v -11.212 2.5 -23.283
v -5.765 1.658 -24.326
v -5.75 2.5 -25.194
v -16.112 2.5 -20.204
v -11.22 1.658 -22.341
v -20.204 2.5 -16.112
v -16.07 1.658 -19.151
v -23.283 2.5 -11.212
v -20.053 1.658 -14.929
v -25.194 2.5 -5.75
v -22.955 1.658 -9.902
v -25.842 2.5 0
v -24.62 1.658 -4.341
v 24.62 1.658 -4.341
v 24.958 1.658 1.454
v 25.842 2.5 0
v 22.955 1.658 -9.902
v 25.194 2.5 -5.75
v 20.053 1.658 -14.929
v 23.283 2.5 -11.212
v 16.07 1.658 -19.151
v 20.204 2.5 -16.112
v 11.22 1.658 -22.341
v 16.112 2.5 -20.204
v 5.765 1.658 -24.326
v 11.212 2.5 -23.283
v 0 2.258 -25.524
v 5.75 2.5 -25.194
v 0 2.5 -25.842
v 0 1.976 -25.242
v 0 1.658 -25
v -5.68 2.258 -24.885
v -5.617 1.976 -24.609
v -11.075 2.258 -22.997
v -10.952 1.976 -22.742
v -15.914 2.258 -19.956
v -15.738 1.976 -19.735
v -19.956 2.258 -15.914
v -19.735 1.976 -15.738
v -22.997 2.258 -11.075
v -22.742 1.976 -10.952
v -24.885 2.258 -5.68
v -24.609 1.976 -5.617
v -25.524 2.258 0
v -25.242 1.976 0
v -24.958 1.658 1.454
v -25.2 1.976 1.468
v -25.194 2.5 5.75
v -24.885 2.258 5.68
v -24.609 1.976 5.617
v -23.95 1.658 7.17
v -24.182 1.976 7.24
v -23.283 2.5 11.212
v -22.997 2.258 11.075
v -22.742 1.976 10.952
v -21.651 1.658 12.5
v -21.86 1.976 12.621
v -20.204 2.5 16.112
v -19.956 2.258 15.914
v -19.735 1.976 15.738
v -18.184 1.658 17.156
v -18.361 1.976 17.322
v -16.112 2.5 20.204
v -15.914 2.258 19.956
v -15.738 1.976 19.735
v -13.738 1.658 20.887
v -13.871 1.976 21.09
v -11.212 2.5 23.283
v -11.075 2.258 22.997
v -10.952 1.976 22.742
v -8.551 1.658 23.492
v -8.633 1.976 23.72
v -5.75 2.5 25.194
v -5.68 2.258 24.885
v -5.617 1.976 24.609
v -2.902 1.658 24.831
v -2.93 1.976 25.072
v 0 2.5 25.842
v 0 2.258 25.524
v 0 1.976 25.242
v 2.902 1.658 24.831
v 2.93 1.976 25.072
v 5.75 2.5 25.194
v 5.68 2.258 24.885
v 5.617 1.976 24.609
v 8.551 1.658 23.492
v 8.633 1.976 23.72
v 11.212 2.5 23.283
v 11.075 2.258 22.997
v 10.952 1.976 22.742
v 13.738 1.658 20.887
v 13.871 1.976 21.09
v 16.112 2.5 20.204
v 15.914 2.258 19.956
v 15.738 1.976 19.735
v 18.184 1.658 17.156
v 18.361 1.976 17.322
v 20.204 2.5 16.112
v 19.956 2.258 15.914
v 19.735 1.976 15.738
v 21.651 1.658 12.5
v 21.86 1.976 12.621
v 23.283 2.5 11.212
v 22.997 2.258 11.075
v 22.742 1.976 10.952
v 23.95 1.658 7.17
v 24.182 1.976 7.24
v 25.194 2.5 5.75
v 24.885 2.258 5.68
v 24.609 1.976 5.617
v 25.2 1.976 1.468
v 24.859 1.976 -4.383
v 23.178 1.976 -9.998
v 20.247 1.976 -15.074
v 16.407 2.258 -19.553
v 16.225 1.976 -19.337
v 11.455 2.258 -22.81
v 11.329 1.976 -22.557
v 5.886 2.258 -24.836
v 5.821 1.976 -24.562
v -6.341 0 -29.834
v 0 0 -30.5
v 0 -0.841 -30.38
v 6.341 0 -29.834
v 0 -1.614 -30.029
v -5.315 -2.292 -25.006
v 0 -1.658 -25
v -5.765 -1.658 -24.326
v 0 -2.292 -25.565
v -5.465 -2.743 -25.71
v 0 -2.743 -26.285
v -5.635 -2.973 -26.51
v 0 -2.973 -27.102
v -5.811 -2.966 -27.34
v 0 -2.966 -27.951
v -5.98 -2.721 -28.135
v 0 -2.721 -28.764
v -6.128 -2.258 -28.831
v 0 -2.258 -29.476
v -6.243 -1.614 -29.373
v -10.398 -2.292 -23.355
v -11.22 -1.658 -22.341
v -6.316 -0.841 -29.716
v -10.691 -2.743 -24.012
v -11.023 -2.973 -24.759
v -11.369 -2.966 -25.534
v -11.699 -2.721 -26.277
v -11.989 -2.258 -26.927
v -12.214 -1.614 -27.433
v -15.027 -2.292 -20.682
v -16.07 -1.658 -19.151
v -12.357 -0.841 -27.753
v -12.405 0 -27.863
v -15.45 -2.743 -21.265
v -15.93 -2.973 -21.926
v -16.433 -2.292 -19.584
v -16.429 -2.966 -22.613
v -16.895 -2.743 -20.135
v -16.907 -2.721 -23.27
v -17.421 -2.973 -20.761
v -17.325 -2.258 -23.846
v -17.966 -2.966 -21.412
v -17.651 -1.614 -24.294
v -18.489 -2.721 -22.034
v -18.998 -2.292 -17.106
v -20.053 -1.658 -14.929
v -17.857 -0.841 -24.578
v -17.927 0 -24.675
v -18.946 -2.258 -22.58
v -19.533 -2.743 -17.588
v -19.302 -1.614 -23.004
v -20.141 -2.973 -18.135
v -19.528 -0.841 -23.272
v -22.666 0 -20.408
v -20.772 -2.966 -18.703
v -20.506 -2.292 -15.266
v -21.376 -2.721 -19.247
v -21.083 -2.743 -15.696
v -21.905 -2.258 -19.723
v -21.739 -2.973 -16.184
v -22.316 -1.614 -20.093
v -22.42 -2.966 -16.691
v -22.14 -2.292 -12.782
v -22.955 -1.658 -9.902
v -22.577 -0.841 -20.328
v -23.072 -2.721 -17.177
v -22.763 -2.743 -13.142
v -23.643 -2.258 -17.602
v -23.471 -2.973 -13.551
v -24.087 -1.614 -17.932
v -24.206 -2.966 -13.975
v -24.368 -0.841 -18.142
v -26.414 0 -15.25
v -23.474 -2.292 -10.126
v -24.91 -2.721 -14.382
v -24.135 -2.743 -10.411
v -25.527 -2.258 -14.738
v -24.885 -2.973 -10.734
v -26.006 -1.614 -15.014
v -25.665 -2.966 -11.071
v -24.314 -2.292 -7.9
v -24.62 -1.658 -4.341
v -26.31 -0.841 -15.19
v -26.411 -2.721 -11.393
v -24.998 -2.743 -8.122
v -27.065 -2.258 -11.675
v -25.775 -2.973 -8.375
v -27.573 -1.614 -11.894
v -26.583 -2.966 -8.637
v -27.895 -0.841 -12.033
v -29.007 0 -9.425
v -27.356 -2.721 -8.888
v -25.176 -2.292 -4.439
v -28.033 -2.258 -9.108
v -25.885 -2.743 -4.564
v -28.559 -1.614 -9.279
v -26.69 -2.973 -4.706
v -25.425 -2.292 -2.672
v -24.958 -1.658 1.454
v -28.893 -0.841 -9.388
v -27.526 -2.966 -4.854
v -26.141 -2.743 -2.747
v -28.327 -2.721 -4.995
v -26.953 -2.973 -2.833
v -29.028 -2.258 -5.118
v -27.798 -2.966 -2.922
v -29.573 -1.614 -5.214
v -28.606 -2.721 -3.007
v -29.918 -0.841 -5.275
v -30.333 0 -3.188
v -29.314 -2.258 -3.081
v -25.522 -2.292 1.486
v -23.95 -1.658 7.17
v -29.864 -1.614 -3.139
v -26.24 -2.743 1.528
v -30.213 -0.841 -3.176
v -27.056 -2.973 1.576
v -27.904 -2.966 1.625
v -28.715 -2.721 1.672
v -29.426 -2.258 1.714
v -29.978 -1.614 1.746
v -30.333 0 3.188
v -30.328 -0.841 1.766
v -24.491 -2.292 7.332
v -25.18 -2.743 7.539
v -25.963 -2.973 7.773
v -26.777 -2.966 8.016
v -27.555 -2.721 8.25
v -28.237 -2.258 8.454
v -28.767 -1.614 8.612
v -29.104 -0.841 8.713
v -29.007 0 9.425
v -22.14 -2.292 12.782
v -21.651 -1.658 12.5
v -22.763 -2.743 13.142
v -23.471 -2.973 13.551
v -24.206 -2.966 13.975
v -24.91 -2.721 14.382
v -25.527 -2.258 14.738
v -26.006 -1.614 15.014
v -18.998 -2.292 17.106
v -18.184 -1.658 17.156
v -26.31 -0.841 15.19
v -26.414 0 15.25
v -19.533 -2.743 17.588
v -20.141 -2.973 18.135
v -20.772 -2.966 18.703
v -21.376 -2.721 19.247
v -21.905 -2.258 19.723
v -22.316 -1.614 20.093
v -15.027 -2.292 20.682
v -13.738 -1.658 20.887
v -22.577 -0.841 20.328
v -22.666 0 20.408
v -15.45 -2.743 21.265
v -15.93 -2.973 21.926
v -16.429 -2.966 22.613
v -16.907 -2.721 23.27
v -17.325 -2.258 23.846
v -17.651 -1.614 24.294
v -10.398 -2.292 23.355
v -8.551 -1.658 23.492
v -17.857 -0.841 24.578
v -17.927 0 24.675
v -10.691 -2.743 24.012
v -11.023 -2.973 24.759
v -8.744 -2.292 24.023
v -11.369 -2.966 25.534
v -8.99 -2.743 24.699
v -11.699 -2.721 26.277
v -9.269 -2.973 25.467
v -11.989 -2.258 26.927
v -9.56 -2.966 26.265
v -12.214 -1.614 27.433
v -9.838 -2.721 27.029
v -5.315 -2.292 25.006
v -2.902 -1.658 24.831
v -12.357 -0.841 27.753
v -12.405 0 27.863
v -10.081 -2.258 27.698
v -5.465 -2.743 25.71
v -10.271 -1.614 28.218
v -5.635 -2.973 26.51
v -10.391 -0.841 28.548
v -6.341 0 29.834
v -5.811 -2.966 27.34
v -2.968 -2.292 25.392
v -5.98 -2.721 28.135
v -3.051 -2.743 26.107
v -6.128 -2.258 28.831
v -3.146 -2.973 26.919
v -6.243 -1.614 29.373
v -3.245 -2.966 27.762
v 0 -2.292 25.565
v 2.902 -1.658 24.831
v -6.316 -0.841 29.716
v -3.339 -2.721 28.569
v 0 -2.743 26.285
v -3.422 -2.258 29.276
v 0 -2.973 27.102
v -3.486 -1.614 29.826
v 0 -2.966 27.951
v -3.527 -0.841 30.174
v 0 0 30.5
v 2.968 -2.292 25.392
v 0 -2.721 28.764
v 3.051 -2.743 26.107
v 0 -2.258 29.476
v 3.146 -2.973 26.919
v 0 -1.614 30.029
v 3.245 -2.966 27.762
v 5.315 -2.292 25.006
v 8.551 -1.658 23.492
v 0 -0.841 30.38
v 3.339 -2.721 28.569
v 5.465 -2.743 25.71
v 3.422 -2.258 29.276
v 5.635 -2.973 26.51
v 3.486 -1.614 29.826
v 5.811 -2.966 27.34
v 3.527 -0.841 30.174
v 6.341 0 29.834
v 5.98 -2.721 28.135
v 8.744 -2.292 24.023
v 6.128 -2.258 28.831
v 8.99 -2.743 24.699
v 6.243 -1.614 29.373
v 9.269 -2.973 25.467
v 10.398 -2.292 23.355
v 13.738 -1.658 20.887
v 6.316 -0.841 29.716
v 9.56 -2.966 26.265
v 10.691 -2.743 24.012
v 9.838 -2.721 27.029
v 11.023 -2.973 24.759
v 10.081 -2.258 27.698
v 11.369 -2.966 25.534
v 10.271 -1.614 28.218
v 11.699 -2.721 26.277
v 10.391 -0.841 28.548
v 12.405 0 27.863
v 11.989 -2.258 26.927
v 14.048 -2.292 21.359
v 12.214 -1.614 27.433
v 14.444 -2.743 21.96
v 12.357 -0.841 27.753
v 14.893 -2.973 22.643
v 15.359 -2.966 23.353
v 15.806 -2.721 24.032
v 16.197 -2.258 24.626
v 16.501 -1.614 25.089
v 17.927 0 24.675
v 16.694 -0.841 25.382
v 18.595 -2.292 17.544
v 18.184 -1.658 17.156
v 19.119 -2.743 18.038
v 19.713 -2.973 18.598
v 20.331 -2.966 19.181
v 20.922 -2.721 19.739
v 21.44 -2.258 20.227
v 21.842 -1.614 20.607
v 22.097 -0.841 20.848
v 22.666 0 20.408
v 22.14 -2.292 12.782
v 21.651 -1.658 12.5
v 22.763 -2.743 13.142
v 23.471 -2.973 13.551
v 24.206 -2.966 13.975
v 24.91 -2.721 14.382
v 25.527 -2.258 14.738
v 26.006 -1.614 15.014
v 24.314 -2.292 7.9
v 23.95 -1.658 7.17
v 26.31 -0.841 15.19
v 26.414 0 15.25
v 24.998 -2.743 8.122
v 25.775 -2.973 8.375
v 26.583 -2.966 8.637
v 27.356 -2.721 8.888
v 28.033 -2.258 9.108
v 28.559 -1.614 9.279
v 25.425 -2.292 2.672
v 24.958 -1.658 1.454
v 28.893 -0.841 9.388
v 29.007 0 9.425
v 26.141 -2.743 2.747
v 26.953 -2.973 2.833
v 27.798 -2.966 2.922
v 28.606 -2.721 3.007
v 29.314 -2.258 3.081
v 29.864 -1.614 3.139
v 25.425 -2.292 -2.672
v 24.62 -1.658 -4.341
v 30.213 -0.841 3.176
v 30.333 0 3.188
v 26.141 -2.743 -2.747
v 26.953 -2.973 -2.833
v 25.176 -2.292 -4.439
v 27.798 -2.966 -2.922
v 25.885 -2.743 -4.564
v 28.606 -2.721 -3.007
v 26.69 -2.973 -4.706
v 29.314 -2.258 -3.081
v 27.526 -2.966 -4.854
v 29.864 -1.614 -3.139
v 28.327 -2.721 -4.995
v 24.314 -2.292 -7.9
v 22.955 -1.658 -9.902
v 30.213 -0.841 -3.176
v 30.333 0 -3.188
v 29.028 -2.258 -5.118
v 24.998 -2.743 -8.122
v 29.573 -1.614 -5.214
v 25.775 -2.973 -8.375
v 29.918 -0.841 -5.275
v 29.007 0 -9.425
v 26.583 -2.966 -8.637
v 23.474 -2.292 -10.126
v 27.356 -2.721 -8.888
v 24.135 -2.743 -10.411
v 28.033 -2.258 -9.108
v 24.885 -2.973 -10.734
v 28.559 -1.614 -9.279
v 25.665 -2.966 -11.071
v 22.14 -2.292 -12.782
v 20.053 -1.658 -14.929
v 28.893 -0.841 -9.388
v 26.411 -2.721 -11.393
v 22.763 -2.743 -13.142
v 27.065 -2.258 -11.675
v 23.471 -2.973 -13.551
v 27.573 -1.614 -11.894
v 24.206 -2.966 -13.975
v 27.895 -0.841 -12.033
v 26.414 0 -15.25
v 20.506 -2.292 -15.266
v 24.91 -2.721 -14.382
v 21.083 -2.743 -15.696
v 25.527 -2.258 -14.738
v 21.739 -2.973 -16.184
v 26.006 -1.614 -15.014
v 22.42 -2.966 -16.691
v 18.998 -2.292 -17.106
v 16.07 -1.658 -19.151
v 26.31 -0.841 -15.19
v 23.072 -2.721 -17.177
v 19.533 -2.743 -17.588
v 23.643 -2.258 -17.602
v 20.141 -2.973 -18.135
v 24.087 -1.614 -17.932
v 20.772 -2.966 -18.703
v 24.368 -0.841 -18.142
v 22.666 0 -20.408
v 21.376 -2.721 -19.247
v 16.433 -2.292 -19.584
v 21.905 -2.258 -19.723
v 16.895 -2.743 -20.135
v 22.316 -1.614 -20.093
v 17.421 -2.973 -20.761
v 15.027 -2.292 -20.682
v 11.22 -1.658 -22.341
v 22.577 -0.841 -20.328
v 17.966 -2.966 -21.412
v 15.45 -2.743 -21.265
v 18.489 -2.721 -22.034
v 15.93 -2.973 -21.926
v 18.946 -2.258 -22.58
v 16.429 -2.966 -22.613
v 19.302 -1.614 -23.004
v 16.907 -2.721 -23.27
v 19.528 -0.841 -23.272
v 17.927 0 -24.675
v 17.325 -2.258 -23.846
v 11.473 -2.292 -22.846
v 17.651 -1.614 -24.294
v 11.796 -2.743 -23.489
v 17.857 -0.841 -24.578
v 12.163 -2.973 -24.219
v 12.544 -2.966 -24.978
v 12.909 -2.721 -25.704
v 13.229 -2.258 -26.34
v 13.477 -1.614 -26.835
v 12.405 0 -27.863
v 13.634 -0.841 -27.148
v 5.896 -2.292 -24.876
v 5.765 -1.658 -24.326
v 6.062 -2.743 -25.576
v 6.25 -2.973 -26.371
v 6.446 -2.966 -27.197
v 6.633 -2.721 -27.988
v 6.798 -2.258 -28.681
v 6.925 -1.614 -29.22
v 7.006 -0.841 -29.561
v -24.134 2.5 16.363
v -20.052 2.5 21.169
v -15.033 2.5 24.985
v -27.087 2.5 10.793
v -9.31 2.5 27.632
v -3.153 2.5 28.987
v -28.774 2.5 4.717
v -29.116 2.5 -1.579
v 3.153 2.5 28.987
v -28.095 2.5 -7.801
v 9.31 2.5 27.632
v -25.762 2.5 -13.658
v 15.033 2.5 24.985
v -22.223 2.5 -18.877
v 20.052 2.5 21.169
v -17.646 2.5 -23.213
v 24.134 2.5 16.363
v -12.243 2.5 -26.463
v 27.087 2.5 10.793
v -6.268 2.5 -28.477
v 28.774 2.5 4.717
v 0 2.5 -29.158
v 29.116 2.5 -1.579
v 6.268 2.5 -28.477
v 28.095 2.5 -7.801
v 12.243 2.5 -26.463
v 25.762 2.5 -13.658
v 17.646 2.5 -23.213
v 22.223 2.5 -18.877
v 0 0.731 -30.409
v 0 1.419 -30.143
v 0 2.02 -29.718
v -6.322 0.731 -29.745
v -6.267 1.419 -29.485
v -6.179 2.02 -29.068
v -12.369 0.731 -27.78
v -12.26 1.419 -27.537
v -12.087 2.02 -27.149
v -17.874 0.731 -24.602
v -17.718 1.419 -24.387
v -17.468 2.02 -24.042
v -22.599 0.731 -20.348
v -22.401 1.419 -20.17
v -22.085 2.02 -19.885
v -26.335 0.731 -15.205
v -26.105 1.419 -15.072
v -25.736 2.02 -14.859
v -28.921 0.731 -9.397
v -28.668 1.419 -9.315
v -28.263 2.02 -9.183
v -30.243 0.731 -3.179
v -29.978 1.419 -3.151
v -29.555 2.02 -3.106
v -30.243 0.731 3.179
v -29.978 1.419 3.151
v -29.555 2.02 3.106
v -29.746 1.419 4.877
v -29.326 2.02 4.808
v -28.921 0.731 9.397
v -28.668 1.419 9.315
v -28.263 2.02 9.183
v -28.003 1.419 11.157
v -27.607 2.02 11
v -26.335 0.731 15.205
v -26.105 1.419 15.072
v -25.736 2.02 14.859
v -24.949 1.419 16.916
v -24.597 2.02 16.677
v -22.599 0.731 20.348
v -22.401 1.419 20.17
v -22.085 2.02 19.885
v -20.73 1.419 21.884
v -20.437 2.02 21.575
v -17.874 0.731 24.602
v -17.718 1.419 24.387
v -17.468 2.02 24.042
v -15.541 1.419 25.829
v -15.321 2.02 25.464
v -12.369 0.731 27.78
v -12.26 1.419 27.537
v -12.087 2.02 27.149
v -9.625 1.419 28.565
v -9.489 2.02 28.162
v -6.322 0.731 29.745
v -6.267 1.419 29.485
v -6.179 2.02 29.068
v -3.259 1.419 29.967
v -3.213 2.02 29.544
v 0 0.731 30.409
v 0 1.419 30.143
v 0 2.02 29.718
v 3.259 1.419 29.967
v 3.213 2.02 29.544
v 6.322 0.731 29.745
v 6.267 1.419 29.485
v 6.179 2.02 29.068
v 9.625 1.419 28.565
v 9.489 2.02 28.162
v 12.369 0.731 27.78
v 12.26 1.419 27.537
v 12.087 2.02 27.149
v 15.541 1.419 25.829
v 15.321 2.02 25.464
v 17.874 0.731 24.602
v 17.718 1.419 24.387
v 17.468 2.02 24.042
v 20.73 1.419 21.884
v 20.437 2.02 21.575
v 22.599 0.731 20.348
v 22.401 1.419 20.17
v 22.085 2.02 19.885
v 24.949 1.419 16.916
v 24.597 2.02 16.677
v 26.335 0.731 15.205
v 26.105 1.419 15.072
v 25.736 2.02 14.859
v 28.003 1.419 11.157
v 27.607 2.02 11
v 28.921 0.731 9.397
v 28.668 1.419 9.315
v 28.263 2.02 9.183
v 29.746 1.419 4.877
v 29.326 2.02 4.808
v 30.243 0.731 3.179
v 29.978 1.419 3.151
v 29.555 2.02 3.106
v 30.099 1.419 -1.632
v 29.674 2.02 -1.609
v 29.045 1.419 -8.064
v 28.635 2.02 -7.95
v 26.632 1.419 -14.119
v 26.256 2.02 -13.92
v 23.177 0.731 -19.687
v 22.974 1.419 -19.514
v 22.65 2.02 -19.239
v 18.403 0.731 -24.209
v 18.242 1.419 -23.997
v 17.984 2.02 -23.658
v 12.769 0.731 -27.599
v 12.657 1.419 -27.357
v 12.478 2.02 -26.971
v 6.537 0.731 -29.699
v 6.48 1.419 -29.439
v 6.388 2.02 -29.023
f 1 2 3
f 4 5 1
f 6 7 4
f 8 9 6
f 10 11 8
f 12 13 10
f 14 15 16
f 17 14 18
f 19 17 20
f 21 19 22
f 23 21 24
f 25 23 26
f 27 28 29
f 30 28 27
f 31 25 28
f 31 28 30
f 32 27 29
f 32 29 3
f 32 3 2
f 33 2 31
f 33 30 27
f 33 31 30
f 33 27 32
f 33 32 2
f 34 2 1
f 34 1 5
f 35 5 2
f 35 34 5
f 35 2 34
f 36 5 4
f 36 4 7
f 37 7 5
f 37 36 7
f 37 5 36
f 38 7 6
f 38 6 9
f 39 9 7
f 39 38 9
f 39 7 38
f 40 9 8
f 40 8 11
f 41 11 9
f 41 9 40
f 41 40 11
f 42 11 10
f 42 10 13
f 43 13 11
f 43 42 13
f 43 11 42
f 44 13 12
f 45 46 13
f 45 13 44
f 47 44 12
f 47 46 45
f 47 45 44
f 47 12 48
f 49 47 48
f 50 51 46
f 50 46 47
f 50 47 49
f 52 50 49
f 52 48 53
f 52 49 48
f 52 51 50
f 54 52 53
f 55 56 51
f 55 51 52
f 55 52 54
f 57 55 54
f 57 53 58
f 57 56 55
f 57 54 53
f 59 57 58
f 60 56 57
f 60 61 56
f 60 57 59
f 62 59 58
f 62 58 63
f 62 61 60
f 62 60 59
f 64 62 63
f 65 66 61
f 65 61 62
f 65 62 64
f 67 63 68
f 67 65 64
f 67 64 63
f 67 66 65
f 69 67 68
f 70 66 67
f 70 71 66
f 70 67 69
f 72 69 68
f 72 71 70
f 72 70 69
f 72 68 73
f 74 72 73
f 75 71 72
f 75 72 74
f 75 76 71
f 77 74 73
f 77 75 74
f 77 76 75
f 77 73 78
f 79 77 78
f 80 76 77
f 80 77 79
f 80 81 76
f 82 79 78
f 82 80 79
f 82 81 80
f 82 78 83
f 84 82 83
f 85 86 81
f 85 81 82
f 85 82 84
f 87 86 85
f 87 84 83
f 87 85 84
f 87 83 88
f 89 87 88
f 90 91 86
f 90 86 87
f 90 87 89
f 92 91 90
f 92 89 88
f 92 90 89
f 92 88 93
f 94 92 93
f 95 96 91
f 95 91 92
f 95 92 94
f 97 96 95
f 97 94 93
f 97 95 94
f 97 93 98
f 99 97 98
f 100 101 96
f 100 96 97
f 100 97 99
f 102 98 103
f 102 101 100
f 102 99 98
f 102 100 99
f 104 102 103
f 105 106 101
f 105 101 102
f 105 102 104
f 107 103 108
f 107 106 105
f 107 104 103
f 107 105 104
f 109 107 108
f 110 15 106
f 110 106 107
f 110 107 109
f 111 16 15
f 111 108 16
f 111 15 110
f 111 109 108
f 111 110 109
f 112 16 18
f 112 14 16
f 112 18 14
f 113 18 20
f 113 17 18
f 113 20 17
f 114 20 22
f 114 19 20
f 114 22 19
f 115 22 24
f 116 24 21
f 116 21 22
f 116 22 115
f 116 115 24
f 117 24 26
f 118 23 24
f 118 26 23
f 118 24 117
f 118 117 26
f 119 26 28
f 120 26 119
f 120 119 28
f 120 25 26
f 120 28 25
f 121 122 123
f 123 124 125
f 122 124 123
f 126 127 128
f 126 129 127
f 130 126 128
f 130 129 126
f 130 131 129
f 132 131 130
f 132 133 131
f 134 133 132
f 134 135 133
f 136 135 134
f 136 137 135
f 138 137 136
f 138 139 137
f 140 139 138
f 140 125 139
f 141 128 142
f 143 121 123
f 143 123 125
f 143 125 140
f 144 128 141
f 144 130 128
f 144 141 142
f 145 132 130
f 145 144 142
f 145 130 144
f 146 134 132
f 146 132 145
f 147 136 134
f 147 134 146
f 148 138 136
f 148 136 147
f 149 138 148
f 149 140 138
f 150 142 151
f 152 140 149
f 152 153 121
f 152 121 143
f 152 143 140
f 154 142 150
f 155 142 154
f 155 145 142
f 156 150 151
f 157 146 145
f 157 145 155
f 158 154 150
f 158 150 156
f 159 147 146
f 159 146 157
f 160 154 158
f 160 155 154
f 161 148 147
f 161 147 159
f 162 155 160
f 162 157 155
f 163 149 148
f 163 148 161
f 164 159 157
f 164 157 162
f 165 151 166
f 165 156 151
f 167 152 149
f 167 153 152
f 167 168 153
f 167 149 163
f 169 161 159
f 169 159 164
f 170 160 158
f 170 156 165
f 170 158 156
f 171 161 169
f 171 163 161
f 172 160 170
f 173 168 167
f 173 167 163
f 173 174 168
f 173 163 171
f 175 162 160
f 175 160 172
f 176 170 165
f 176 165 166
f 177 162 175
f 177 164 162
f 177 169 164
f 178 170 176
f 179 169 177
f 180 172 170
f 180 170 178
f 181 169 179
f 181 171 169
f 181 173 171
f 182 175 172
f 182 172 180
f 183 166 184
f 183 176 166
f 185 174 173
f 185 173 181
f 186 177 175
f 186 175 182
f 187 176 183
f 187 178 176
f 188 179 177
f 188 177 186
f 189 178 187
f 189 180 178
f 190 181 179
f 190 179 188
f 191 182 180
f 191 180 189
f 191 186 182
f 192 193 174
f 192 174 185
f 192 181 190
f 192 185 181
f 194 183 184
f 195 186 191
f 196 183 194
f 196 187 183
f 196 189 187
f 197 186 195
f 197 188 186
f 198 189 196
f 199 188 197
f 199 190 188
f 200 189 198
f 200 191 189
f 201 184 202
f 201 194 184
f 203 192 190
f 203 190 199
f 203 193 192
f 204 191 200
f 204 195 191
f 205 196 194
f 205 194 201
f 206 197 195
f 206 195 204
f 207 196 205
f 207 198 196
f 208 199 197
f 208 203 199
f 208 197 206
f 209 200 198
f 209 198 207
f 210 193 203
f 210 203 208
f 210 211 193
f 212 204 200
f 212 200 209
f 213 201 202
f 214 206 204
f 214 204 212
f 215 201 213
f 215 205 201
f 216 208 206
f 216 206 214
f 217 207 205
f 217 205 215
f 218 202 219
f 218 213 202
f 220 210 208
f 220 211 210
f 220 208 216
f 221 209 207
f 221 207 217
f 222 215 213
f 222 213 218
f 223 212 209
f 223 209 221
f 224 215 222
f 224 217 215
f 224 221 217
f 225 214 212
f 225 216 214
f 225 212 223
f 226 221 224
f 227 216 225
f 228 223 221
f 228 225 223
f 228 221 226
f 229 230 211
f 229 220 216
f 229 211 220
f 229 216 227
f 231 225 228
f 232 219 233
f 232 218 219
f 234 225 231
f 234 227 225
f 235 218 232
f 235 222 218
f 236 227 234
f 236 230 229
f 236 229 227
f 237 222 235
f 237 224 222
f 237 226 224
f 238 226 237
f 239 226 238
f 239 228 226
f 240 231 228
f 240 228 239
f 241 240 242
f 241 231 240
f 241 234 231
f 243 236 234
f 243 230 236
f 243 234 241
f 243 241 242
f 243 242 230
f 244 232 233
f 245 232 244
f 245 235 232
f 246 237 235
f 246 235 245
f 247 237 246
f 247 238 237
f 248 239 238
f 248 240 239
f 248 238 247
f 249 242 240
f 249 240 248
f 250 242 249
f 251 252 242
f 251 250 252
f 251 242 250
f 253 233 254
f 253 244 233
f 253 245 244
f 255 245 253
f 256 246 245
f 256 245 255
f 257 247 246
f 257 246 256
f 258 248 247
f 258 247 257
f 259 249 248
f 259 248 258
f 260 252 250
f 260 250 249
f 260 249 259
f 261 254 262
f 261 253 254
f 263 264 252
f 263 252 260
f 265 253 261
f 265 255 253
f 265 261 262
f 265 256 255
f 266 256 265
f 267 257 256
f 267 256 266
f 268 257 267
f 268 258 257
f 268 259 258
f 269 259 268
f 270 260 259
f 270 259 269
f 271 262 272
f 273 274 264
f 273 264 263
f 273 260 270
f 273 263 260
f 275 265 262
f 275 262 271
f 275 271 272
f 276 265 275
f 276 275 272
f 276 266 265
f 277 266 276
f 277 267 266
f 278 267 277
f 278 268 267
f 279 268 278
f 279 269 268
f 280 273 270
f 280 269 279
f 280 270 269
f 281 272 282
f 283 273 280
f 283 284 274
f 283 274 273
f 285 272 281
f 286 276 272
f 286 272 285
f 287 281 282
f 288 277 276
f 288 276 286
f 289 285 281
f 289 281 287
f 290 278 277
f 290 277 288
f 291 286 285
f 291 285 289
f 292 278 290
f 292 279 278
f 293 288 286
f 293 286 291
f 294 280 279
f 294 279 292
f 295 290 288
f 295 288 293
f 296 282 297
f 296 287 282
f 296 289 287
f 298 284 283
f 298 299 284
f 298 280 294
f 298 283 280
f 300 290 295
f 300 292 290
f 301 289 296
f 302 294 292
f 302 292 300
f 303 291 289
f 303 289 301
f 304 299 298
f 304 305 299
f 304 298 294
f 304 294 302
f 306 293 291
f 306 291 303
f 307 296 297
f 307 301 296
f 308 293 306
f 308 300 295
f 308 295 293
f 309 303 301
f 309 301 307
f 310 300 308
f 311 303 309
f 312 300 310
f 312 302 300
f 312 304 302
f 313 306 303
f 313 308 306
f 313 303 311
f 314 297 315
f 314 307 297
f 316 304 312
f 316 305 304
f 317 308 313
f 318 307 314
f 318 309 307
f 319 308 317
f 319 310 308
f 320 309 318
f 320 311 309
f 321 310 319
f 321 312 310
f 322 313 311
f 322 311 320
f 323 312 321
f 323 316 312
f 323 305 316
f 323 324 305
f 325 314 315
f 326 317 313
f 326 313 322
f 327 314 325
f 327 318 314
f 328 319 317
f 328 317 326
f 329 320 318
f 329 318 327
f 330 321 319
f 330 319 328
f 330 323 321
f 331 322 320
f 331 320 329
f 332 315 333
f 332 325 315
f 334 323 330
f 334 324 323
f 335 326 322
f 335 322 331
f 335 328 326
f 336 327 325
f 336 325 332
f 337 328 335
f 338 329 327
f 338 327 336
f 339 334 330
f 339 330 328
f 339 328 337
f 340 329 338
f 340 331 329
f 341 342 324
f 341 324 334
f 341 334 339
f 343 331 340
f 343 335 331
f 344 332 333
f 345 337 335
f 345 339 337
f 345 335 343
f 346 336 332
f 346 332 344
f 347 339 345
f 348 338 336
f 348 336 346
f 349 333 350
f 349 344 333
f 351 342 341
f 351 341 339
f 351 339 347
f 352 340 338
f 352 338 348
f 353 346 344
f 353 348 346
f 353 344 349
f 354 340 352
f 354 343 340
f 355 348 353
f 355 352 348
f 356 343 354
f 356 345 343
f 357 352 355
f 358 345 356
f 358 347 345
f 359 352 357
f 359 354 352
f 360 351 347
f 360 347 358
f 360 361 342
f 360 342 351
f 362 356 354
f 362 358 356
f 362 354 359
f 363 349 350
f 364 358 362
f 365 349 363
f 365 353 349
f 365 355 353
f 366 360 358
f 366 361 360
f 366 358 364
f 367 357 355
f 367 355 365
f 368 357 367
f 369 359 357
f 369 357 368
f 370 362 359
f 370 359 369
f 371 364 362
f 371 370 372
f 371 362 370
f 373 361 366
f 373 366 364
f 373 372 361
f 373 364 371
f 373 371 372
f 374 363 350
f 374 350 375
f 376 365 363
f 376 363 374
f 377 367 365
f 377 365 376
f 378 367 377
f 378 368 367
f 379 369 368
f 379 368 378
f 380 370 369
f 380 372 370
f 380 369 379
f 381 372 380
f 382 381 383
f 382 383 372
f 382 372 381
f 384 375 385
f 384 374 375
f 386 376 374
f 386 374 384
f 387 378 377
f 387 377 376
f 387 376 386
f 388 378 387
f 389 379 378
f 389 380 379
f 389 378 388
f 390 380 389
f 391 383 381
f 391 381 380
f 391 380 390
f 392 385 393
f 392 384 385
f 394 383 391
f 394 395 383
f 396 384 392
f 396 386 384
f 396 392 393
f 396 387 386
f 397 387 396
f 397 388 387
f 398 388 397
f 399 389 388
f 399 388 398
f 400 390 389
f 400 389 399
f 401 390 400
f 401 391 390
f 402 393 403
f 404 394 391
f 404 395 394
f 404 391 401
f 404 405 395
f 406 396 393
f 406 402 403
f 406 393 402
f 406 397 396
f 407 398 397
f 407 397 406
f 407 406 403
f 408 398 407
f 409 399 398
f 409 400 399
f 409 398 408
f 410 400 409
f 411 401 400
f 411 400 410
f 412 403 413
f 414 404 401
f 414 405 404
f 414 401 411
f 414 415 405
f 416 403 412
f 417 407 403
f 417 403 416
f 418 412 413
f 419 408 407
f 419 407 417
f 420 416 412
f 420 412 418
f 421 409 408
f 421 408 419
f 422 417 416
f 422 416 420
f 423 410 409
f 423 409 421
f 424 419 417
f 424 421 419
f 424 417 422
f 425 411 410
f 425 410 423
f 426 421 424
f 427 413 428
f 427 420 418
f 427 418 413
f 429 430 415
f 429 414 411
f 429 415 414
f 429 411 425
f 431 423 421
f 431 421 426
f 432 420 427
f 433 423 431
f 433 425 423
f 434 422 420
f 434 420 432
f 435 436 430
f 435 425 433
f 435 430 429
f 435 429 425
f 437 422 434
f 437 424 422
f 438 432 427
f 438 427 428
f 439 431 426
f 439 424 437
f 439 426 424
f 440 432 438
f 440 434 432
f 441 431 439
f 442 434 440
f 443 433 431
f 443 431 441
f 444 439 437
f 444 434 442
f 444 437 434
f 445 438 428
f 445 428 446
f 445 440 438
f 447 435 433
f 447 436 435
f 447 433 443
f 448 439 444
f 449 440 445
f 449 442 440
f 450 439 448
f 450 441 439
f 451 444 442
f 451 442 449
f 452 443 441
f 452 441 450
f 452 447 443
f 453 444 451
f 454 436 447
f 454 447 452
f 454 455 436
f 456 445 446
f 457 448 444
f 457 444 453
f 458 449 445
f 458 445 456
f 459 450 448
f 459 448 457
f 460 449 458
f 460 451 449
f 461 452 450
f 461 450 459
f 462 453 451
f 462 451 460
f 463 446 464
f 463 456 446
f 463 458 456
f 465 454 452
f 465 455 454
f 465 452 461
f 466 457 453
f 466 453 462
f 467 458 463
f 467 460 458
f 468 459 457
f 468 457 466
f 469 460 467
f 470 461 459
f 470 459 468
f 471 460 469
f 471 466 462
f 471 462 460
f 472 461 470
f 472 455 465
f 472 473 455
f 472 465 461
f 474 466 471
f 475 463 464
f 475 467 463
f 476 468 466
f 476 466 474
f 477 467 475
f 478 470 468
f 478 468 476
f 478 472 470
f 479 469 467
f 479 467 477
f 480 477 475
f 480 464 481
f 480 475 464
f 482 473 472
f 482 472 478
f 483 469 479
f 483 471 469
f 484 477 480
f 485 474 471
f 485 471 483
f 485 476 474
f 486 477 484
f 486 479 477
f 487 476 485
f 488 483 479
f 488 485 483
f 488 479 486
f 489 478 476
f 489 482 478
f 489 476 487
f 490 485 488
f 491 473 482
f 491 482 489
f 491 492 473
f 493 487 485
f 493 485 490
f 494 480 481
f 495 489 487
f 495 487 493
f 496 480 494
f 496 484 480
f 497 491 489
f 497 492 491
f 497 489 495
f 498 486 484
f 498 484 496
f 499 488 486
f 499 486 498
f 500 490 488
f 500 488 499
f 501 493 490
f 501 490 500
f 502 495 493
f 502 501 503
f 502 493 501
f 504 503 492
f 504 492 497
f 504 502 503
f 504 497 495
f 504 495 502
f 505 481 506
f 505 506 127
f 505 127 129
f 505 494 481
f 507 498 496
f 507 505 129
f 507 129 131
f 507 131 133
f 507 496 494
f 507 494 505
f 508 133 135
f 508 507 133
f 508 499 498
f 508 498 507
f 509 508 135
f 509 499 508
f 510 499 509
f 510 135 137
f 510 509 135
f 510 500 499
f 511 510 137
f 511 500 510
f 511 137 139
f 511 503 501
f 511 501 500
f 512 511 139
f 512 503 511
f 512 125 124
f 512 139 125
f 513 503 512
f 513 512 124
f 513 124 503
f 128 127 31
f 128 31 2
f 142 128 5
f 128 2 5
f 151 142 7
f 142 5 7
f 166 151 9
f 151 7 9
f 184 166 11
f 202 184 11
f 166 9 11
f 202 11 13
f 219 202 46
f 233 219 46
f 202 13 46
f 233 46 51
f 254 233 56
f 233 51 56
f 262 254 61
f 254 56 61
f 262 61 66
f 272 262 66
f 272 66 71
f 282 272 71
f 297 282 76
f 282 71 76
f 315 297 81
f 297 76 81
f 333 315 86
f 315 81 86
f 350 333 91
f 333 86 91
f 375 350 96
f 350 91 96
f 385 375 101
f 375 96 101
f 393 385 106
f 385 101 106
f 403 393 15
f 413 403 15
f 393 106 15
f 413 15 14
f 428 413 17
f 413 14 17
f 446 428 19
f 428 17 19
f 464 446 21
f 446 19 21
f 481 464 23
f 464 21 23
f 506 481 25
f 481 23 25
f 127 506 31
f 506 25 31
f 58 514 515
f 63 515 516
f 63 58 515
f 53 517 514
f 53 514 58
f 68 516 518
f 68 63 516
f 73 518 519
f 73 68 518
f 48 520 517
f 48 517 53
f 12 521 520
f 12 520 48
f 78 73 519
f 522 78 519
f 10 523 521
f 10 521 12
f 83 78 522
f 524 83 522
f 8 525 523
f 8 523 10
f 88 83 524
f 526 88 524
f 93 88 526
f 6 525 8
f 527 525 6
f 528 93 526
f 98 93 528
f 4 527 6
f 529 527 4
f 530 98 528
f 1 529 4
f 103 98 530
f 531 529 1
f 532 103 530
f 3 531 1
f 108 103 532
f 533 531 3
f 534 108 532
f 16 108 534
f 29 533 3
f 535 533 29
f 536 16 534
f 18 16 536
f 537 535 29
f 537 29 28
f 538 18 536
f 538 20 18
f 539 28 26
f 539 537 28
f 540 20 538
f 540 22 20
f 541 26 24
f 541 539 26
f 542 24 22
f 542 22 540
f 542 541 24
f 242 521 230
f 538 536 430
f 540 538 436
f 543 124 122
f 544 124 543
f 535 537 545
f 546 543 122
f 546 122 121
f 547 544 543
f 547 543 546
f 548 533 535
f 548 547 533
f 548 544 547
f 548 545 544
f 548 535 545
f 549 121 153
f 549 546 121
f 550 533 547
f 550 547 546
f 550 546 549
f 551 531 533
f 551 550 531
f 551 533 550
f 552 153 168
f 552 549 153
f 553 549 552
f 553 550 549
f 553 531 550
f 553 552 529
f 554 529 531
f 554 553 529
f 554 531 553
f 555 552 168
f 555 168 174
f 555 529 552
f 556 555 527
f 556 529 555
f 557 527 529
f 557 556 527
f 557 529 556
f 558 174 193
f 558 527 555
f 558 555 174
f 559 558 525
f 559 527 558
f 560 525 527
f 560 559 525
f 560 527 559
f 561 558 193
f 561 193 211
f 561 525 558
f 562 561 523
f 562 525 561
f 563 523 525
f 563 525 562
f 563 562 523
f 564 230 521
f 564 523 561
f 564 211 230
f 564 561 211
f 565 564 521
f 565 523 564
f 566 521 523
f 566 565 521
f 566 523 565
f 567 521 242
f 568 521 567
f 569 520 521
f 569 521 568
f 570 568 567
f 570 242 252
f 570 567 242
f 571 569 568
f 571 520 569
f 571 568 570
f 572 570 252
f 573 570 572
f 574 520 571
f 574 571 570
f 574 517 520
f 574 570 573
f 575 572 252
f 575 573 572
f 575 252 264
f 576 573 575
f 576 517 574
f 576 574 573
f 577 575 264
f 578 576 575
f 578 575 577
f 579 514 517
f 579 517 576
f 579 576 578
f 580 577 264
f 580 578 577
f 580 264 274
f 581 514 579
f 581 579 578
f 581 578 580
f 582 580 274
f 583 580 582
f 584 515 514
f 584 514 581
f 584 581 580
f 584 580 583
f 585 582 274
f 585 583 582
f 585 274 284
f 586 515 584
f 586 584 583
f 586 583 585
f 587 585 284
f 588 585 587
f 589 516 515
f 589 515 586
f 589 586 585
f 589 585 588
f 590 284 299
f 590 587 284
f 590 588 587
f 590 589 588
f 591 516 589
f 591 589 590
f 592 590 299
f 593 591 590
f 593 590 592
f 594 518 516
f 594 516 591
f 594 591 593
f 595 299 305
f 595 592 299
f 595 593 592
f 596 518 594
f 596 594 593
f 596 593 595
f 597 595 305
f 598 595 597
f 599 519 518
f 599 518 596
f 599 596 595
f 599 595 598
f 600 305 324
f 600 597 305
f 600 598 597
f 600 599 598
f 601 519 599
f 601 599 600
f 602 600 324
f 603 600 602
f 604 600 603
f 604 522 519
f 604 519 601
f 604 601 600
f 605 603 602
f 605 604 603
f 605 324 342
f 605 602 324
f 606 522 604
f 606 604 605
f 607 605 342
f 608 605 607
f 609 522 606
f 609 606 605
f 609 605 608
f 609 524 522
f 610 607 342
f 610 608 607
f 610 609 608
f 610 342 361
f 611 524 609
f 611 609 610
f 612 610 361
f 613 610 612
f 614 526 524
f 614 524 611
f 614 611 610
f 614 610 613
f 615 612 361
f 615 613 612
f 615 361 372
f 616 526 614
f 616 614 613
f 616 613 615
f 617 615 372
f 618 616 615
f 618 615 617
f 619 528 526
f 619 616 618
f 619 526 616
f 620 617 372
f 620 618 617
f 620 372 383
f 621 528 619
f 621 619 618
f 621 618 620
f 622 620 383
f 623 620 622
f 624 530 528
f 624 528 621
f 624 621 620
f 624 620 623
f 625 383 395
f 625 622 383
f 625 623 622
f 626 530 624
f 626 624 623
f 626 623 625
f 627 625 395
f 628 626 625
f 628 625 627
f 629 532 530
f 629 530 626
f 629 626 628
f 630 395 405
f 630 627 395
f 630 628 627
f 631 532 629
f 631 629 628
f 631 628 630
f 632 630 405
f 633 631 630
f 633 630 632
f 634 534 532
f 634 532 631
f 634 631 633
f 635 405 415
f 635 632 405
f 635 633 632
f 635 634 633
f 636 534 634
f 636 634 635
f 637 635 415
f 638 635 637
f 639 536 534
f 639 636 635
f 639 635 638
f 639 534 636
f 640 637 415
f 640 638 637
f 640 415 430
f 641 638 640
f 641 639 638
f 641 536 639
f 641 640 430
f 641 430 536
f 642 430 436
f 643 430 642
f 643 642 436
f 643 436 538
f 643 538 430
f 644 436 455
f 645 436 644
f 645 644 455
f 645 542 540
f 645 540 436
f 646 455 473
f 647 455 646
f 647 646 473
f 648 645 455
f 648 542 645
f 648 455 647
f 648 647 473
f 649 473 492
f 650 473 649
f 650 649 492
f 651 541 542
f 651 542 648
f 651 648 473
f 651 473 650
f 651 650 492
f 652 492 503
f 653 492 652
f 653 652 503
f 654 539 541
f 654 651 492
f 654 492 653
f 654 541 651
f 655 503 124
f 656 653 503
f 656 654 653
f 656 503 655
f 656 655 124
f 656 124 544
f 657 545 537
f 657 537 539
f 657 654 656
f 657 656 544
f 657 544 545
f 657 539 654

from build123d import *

# Parameters (mm, degrees)
SKETCH_2_R          = 3
SKETCH_3_R          = 25
CUT_EXTRUDE_1_DEPTH = 5
SKETCH_4_R          = 35
CUT_EXTRUDE_2_DEPTH = 10


with BuildPart() as part:
    # ｽｹｯﾁ2 → 回転1 (revolve)
    with BuildSketch(Plane.XY, mode=Mode.PRIVATE) as revolve_1_sk:
        with Locations((27.5, 0)):
            Circle(SKETCH_2_R)
    revolve(revolve_1_sk.sketch.rotate(Axis((0, 0, 0), (0, 1, 0)), 90), axis=Axis((0, 0, 0), (0, 1, 0)))

    # ｽｹｯﾁ3 → ｶｯﾄ - 押し出し1 (cut, symmetric)
    with BuildSketch(Plane(origin=(0, 0, 0), x_dir=(1, 0, 0), z_dir=(0, 1, 0))):
        with Locations(Location((0, 0, 0), (0, 0, 90))):
            Circle(SKETCH_3_R)
    extrude(amount=CUT_EXTRUDE_1_DEPTH, both=True, mode=Mode.SUBTRACT)

    # ｽｹｯﾁ4 → ｶｯﾄ - 押し出し2 (cut)
    with BuildSketch(Plane(origin=(0, 2.5, 0), x_dir=(1, 0, 0), z_dir=(0, 1, 0))):
        Circle(SKETCH_4_R)
    extrude(amount=CUT_EXTRUDE_2_DEPTH, mode=Mode.SUBTRACT)


solid = part.part
